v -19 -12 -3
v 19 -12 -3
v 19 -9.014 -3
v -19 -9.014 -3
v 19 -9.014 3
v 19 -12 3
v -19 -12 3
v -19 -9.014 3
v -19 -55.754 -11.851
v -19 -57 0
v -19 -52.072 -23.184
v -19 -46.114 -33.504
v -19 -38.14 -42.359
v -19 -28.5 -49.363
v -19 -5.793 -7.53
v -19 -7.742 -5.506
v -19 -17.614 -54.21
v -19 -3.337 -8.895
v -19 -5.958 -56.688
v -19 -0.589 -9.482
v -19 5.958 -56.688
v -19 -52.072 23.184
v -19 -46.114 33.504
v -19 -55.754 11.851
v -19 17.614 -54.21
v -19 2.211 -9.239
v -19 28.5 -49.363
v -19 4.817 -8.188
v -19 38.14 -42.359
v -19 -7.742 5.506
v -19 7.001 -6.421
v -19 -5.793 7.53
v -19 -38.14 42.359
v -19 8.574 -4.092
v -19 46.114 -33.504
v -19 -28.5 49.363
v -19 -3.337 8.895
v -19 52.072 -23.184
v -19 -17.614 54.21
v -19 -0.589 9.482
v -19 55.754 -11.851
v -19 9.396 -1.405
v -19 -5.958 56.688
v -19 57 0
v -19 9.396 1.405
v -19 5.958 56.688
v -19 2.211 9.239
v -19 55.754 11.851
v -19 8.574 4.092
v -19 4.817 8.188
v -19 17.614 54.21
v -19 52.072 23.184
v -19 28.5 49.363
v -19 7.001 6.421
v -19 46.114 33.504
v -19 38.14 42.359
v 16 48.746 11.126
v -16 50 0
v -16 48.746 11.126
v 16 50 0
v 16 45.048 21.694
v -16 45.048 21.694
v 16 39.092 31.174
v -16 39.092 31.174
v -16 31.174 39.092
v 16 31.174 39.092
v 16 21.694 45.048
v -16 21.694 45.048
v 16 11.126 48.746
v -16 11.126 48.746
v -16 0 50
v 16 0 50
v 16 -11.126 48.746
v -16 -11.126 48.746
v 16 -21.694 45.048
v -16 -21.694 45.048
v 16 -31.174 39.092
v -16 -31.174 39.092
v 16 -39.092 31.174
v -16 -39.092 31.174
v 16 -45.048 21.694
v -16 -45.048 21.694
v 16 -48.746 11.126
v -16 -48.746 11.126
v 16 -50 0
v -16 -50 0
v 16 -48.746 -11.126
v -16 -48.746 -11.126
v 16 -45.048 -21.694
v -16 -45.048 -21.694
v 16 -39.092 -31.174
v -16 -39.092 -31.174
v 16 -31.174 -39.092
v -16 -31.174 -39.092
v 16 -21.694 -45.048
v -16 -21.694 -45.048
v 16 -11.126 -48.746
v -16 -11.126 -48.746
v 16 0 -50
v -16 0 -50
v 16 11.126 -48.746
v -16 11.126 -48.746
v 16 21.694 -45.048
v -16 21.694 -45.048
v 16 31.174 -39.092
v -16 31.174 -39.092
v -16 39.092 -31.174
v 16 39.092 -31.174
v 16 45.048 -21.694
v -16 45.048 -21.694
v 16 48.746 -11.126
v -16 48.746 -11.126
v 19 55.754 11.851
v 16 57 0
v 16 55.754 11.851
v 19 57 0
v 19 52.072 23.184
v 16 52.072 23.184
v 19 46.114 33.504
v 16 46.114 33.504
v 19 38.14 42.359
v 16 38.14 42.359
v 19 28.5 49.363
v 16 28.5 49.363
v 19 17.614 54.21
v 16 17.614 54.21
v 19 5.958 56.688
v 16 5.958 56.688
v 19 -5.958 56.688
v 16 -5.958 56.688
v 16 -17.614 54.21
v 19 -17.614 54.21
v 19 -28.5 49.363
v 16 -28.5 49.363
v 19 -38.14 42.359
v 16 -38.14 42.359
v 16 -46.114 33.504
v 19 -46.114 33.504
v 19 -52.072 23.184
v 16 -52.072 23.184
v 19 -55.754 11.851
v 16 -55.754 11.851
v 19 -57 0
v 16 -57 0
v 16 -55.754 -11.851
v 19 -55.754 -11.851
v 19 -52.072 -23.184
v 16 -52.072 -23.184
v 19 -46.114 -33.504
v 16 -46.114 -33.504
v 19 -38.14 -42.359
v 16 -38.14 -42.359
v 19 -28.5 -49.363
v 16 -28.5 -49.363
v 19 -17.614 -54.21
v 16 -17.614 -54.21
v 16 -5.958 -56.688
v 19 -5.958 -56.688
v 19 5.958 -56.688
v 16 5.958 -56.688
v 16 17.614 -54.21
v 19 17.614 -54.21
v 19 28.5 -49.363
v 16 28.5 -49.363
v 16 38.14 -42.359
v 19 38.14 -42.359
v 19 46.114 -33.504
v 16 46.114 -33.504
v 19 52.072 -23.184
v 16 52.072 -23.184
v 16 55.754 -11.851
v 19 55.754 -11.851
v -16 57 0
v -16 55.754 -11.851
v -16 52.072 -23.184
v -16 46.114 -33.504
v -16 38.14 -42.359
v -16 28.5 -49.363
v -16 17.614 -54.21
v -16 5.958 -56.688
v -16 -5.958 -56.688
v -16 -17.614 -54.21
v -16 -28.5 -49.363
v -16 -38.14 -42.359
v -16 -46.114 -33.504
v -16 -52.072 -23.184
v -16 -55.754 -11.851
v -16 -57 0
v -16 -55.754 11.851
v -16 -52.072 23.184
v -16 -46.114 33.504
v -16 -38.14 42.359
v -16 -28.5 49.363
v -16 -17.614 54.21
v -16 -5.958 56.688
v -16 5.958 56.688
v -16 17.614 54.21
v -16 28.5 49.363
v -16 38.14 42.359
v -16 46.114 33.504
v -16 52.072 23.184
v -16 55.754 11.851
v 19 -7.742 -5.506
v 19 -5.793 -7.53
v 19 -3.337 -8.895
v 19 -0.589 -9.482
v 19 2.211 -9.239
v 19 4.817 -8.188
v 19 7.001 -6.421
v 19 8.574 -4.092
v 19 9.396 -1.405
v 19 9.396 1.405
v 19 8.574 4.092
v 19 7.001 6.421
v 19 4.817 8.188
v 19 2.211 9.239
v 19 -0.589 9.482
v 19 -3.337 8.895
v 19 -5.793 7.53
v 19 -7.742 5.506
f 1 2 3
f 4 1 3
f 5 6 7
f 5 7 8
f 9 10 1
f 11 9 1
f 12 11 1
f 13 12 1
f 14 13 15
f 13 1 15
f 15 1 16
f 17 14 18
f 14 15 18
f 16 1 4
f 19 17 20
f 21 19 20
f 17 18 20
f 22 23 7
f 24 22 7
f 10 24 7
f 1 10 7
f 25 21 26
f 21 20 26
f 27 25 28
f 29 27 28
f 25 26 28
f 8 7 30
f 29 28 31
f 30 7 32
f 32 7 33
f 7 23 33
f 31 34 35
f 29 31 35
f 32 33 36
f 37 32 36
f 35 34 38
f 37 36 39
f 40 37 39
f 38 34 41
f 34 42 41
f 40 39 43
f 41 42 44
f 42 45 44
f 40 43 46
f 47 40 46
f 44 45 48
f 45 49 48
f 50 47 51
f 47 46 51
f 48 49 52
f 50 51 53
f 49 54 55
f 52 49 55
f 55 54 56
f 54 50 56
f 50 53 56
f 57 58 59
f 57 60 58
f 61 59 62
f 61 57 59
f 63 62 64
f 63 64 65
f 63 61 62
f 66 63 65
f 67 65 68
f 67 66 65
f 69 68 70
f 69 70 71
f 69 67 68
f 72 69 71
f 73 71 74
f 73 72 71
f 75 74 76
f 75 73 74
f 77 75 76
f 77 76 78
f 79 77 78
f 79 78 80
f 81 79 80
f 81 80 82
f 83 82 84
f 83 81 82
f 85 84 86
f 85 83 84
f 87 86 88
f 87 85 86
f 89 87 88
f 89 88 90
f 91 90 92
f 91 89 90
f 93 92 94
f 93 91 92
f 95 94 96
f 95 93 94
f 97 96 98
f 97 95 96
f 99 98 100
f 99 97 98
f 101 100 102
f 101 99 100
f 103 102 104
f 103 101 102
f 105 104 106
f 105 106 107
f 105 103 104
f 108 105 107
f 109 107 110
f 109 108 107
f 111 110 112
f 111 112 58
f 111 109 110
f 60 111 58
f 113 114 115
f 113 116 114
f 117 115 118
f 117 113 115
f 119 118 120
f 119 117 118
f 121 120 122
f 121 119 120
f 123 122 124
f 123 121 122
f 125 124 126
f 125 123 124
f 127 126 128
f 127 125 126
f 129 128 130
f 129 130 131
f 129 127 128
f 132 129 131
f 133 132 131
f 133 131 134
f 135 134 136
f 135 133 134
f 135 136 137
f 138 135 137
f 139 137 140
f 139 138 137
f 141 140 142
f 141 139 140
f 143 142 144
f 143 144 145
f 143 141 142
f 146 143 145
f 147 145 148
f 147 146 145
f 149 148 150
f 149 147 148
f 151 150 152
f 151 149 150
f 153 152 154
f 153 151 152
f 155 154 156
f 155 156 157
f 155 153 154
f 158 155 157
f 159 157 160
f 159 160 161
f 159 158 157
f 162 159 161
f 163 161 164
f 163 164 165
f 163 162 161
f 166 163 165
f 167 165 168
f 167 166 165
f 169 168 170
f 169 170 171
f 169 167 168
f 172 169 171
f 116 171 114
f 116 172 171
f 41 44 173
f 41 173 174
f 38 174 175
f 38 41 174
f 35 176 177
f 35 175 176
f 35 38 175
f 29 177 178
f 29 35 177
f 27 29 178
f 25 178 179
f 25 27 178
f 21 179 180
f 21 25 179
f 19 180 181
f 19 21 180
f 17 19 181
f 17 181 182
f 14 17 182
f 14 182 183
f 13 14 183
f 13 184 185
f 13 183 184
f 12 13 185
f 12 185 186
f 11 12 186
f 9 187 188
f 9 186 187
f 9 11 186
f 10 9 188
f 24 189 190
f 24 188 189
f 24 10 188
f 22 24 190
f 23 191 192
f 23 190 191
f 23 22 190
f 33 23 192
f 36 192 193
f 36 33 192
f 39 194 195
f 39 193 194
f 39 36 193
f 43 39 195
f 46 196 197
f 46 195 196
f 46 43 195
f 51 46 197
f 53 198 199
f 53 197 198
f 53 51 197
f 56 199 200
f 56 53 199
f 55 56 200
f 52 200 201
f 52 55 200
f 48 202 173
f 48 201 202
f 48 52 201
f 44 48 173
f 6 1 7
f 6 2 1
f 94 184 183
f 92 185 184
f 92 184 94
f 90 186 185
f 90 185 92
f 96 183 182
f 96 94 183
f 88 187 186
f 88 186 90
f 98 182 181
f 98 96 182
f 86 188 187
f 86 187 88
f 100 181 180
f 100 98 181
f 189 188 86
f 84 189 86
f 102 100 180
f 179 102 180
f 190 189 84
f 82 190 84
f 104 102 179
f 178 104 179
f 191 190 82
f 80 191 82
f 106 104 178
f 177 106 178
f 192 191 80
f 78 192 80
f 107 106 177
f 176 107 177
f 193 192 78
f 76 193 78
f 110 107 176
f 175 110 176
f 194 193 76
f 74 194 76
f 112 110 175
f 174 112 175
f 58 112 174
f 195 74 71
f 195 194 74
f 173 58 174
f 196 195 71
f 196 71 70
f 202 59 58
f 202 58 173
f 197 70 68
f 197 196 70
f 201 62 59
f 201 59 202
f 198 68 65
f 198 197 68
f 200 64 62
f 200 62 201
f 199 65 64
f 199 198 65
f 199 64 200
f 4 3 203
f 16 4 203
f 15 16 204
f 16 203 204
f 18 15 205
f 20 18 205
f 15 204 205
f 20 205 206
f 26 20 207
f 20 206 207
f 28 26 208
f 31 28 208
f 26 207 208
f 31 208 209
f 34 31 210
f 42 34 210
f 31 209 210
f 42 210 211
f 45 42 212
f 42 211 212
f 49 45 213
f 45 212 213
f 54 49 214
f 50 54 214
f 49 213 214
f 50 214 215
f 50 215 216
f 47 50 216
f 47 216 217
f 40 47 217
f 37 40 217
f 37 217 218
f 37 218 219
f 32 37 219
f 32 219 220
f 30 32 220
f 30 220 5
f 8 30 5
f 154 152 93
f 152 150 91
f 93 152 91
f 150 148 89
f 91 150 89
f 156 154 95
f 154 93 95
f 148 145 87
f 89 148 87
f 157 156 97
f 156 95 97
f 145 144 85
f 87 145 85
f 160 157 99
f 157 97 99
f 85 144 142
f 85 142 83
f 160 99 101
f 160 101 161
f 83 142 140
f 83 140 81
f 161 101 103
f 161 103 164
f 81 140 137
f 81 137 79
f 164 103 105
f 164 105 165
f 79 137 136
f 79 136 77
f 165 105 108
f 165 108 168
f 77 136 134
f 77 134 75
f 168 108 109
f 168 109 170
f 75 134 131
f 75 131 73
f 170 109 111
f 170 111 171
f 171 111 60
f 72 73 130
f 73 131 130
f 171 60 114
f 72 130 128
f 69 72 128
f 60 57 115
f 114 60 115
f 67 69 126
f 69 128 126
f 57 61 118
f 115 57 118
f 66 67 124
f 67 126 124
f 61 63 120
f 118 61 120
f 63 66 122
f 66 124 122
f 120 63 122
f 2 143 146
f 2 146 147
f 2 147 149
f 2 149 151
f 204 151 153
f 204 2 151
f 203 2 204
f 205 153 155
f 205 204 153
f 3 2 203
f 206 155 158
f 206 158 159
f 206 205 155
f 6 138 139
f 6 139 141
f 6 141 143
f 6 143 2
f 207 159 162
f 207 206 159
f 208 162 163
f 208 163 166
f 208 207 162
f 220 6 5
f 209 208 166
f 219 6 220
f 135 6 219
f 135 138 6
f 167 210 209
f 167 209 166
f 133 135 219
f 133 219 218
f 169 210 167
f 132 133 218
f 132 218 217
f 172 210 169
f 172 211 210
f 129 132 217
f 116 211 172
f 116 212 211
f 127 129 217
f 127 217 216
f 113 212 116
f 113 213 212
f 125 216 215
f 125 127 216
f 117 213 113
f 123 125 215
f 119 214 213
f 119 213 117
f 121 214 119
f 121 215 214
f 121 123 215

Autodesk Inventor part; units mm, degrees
ref_plane "YZ Plane" through (0, 0, 0) normal (1, 0, 0) x (0, 1, 0)
ref_plane "XZ Plane" through (0, 0, 0) normal (0, 1, 0) x (-1, 0, 0)
ref_plane "XY Plane" through (0, 0, 0) normal (0, 0, 1) x (1, 0, 0)
sketch "Schizzo1" plane through (0, 0, 0) normal (0, 0, 1) x (1, 0, 0)
  line L0 (-16, 50) -> (16, 50)
  line L1 (-16, 50) -> (-16, 57)
  line L2 (-16, 57) -> (-19, 57)
  line L3 (-19, 57) -> (-19, 0)
  line L4 (16, 50) -> (16, 57)
  line L5 (16, 57) -> (19, 57)
  line L6 (19, 57) -> (19, 0)
  line L7 (-19, 0) -> (19, 0)
  point P0 (0, 0)
  point P1 (0, 0)
  dimension "d2" = 7
  dimension "d3" = 3
  dimension "d4" = 3
  dimension "d5" = 7
  dimension "d6" = 100
  dimension "d7" = 32
  dimension "d8" = 38
revolve "Rivoluzione1" add sketch "Schizzo1" angle 360 about axis through (-19, 0, 0) along (1, 0, 0)
sketch "Schizzo3" plane through (19, 0, 0) normal (1, 0, 0) x (0, 0, -1)
  arc A0 (3, -9.0139) -> (-3, -9.0139) centre (0, 0) ccw projected
  line L0 (3, -12) -> (-3, -12) projected
  arc A1 (3, -9.0139) -> (-3, -9.0139) centre (0, 0) ccw
  line L1 (-3, -12) -> (3, -12)
  line L2 (3, -12) -> (3, -9.0139)
  line L3 (-3, -12) -> (-3, -9.0139)
  point P0 (0, 0)
extrude "Estrusione2" cut sketch "Schizzo3" against normal up to next
properties part number "Puleggia minore" material "Alluminio 6061"
